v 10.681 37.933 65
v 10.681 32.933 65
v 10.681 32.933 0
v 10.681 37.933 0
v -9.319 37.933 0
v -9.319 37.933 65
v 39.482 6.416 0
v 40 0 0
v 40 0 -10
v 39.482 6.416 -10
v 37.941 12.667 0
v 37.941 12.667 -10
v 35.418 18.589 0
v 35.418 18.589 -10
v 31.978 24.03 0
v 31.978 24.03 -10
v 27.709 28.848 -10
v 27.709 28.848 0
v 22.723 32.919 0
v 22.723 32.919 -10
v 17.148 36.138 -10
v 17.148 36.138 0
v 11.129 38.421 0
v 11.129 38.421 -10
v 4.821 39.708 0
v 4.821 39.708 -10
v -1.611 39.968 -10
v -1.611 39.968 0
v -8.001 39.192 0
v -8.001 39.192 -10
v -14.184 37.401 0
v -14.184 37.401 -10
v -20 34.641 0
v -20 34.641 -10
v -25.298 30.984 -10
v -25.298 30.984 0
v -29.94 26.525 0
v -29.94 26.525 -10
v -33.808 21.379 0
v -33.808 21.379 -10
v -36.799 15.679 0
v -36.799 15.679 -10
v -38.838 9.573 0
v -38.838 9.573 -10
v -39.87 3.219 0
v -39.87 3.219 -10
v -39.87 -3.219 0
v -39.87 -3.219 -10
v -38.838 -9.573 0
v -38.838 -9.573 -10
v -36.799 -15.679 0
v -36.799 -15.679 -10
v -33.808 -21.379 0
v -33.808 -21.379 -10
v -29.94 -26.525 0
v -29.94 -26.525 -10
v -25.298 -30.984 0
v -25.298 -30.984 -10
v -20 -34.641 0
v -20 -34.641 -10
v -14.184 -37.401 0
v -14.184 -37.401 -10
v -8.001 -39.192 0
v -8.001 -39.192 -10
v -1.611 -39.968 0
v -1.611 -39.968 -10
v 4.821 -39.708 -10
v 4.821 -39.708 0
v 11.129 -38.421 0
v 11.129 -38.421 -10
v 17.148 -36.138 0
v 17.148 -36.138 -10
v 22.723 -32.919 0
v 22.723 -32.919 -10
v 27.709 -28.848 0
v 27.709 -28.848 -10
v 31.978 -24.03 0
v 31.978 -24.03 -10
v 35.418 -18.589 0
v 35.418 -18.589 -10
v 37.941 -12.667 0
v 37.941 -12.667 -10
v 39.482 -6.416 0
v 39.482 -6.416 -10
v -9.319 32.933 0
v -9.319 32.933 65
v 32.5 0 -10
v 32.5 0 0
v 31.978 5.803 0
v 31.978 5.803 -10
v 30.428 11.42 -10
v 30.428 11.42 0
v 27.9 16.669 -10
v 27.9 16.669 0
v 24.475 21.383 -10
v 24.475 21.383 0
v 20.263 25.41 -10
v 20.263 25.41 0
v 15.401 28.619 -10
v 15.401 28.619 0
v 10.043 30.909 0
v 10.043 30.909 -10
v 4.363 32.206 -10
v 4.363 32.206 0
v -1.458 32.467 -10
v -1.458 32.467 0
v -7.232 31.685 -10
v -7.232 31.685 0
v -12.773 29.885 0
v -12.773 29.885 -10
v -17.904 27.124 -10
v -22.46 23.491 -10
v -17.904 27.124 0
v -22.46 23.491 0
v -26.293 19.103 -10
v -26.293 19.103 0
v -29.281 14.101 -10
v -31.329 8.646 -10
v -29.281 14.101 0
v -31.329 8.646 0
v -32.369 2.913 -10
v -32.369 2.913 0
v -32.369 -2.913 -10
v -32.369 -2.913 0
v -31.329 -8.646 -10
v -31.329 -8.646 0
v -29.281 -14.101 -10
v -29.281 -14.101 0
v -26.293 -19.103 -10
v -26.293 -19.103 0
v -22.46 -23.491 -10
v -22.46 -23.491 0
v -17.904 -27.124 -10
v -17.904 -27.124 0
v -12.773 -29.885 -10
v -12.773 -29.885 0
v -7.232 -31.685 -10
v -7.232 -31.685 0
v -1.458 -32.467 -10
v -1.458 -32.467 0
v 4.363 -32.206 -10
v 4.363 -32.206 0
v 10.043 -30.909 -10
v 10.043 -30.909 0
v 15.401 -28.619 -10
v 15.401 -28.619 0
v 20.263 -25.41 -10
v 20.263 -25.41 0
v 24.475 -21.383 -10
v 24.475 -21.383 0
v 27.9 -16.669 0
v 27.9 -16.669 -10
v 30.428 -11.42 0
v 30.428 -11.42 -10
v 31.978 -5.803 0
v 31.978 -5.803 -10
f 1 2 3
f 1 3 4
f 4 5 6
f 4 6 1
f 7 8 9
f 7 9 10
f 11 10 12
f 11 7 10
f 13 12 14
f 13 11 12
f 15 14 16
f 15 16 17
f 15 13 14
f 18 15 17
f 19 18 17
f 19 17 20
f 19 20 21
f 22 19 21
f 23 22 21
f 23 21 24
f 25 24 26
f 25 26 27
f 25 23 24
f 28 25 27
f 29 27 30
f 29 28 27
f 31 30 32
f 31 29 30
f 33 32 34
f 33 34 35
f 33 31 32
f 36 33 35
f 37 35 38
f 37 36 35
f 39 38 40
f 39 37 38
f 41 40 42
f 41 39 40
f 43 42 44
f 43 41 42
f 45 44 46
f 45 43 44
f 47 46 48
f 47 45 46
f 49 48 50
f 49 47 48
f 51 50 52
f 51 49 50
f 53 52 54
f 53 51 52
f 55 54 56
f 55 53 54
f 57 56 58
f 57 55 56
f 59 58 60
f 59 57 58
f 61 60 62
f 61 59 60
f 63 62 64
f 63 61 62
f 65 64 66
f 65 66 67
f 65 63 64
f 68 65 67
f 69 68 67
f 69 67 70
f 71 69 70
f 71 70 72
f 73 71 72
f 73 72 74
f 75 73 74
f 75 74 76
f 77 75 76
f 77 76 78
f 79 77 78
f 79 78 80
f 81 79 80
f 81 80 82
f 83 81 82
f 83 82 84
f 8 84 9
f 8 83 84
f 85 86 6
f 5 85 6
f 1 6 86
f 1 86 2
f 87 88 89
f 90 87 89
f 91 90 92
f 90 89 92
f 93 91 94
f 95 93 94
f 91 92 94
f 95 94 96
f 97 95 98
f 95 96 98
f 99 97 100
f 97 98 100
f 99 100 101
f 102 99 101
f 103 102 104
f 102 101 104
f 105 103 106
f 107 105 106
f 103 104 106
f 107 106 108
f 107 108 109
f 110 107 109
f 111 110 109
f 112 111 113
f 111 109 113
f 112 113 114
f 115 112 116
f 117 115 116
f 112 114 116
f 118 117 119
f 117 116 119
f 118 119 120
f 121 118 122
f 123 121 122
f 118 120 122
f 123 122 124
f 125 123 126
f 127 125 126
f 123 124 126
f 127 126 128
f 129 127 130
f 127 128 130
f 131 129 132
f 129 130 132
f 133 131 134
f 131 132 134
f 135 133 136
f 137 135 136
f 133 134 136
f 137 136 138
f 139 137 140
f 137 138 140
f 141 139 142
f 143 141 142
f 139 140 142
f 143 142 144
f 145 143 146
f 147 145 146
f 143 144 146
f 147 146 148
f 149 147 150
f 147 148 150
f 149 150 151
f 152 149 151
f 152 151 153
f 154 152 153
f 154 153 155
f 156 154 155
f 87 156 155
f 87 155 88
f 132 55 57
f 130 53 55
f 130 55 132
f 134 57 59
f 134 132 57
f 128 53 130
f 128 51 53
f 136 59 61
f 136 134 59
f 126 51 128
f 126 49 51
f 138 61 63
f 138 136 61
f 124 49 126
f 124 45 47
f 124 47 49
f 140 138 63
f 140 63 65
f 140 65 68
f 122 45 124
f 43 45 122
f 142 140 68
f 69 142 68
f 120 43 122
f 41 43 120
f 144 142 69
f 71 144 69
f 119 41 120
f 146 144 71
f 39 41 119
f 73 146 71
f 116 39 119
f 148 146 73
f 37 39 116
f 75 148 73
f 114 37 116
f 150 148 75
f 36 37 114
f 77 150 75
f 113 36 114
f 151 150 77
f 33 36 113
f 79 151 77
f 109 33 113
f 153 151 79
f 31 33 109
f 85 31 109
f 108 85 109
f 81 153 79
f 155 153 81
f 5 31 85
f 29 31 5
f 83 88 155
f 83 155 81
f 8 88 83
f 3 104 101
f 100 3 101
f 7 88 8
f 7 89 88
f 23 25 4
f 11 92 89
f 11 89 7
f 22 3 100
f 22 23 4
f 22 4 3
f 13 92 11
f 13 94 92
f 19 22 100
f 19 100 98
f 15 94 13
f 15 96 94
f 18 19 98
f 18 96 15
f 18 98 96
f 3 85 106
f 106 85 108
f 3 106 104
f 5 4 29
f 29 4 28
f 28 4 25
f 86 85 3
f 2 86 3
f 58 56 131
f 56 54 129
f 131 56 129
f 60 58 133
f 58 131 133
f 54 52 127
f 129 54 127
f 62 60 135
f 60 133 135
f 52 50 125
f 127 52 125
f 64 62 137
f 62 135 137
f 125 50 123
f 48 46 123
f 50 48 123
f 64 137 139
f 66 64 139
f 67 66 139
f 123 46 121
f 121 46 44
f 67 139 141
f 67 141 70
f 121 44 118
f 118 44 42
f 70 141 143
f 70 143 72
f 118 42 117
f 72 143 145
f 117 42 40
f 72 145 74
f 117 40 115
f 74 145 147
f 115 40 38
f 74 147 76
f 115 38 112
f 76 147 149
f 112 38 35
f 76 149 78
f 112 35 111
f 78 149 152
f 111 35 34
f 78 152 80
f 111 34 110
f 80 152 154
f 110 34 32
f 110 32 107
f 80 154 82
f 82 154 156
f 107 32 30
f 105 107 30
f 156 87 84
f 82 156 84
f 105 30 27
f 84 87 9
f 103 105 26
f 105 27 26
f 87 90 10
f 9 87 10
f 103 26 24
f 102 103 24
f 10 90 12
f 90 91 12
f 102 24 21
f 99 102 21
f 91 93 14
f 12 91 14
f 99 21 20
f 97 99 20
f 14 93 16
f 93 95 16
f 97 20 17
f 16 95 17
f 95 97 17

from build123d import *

# Parameters (mm, degrees)
F0_R     = 40
F0_R_2   = 32.5
F1_DEPTH = 10
F2_W     = 20
F2_H     = 5
F3_DEPTH = 65


with BuildPart() as f1:
    # F0 (on Top) → F1 (new body)
    with BuildSketch(Plane.XY):
        Circle(F0_R)
        Circle(F0_R_2, mode=Mode.SUBTRACT)
    extrude(amount=-F1_DEPTH)

    # F2 (on Top) → F3 (join)
    with BuildSketch(Plane.XY):
        with Locations((0.680517, 35.432968)):
            Rectangle(F2_W, F2_H)
    extrude(amount=F3_DEPTH)


solid = f1.part
